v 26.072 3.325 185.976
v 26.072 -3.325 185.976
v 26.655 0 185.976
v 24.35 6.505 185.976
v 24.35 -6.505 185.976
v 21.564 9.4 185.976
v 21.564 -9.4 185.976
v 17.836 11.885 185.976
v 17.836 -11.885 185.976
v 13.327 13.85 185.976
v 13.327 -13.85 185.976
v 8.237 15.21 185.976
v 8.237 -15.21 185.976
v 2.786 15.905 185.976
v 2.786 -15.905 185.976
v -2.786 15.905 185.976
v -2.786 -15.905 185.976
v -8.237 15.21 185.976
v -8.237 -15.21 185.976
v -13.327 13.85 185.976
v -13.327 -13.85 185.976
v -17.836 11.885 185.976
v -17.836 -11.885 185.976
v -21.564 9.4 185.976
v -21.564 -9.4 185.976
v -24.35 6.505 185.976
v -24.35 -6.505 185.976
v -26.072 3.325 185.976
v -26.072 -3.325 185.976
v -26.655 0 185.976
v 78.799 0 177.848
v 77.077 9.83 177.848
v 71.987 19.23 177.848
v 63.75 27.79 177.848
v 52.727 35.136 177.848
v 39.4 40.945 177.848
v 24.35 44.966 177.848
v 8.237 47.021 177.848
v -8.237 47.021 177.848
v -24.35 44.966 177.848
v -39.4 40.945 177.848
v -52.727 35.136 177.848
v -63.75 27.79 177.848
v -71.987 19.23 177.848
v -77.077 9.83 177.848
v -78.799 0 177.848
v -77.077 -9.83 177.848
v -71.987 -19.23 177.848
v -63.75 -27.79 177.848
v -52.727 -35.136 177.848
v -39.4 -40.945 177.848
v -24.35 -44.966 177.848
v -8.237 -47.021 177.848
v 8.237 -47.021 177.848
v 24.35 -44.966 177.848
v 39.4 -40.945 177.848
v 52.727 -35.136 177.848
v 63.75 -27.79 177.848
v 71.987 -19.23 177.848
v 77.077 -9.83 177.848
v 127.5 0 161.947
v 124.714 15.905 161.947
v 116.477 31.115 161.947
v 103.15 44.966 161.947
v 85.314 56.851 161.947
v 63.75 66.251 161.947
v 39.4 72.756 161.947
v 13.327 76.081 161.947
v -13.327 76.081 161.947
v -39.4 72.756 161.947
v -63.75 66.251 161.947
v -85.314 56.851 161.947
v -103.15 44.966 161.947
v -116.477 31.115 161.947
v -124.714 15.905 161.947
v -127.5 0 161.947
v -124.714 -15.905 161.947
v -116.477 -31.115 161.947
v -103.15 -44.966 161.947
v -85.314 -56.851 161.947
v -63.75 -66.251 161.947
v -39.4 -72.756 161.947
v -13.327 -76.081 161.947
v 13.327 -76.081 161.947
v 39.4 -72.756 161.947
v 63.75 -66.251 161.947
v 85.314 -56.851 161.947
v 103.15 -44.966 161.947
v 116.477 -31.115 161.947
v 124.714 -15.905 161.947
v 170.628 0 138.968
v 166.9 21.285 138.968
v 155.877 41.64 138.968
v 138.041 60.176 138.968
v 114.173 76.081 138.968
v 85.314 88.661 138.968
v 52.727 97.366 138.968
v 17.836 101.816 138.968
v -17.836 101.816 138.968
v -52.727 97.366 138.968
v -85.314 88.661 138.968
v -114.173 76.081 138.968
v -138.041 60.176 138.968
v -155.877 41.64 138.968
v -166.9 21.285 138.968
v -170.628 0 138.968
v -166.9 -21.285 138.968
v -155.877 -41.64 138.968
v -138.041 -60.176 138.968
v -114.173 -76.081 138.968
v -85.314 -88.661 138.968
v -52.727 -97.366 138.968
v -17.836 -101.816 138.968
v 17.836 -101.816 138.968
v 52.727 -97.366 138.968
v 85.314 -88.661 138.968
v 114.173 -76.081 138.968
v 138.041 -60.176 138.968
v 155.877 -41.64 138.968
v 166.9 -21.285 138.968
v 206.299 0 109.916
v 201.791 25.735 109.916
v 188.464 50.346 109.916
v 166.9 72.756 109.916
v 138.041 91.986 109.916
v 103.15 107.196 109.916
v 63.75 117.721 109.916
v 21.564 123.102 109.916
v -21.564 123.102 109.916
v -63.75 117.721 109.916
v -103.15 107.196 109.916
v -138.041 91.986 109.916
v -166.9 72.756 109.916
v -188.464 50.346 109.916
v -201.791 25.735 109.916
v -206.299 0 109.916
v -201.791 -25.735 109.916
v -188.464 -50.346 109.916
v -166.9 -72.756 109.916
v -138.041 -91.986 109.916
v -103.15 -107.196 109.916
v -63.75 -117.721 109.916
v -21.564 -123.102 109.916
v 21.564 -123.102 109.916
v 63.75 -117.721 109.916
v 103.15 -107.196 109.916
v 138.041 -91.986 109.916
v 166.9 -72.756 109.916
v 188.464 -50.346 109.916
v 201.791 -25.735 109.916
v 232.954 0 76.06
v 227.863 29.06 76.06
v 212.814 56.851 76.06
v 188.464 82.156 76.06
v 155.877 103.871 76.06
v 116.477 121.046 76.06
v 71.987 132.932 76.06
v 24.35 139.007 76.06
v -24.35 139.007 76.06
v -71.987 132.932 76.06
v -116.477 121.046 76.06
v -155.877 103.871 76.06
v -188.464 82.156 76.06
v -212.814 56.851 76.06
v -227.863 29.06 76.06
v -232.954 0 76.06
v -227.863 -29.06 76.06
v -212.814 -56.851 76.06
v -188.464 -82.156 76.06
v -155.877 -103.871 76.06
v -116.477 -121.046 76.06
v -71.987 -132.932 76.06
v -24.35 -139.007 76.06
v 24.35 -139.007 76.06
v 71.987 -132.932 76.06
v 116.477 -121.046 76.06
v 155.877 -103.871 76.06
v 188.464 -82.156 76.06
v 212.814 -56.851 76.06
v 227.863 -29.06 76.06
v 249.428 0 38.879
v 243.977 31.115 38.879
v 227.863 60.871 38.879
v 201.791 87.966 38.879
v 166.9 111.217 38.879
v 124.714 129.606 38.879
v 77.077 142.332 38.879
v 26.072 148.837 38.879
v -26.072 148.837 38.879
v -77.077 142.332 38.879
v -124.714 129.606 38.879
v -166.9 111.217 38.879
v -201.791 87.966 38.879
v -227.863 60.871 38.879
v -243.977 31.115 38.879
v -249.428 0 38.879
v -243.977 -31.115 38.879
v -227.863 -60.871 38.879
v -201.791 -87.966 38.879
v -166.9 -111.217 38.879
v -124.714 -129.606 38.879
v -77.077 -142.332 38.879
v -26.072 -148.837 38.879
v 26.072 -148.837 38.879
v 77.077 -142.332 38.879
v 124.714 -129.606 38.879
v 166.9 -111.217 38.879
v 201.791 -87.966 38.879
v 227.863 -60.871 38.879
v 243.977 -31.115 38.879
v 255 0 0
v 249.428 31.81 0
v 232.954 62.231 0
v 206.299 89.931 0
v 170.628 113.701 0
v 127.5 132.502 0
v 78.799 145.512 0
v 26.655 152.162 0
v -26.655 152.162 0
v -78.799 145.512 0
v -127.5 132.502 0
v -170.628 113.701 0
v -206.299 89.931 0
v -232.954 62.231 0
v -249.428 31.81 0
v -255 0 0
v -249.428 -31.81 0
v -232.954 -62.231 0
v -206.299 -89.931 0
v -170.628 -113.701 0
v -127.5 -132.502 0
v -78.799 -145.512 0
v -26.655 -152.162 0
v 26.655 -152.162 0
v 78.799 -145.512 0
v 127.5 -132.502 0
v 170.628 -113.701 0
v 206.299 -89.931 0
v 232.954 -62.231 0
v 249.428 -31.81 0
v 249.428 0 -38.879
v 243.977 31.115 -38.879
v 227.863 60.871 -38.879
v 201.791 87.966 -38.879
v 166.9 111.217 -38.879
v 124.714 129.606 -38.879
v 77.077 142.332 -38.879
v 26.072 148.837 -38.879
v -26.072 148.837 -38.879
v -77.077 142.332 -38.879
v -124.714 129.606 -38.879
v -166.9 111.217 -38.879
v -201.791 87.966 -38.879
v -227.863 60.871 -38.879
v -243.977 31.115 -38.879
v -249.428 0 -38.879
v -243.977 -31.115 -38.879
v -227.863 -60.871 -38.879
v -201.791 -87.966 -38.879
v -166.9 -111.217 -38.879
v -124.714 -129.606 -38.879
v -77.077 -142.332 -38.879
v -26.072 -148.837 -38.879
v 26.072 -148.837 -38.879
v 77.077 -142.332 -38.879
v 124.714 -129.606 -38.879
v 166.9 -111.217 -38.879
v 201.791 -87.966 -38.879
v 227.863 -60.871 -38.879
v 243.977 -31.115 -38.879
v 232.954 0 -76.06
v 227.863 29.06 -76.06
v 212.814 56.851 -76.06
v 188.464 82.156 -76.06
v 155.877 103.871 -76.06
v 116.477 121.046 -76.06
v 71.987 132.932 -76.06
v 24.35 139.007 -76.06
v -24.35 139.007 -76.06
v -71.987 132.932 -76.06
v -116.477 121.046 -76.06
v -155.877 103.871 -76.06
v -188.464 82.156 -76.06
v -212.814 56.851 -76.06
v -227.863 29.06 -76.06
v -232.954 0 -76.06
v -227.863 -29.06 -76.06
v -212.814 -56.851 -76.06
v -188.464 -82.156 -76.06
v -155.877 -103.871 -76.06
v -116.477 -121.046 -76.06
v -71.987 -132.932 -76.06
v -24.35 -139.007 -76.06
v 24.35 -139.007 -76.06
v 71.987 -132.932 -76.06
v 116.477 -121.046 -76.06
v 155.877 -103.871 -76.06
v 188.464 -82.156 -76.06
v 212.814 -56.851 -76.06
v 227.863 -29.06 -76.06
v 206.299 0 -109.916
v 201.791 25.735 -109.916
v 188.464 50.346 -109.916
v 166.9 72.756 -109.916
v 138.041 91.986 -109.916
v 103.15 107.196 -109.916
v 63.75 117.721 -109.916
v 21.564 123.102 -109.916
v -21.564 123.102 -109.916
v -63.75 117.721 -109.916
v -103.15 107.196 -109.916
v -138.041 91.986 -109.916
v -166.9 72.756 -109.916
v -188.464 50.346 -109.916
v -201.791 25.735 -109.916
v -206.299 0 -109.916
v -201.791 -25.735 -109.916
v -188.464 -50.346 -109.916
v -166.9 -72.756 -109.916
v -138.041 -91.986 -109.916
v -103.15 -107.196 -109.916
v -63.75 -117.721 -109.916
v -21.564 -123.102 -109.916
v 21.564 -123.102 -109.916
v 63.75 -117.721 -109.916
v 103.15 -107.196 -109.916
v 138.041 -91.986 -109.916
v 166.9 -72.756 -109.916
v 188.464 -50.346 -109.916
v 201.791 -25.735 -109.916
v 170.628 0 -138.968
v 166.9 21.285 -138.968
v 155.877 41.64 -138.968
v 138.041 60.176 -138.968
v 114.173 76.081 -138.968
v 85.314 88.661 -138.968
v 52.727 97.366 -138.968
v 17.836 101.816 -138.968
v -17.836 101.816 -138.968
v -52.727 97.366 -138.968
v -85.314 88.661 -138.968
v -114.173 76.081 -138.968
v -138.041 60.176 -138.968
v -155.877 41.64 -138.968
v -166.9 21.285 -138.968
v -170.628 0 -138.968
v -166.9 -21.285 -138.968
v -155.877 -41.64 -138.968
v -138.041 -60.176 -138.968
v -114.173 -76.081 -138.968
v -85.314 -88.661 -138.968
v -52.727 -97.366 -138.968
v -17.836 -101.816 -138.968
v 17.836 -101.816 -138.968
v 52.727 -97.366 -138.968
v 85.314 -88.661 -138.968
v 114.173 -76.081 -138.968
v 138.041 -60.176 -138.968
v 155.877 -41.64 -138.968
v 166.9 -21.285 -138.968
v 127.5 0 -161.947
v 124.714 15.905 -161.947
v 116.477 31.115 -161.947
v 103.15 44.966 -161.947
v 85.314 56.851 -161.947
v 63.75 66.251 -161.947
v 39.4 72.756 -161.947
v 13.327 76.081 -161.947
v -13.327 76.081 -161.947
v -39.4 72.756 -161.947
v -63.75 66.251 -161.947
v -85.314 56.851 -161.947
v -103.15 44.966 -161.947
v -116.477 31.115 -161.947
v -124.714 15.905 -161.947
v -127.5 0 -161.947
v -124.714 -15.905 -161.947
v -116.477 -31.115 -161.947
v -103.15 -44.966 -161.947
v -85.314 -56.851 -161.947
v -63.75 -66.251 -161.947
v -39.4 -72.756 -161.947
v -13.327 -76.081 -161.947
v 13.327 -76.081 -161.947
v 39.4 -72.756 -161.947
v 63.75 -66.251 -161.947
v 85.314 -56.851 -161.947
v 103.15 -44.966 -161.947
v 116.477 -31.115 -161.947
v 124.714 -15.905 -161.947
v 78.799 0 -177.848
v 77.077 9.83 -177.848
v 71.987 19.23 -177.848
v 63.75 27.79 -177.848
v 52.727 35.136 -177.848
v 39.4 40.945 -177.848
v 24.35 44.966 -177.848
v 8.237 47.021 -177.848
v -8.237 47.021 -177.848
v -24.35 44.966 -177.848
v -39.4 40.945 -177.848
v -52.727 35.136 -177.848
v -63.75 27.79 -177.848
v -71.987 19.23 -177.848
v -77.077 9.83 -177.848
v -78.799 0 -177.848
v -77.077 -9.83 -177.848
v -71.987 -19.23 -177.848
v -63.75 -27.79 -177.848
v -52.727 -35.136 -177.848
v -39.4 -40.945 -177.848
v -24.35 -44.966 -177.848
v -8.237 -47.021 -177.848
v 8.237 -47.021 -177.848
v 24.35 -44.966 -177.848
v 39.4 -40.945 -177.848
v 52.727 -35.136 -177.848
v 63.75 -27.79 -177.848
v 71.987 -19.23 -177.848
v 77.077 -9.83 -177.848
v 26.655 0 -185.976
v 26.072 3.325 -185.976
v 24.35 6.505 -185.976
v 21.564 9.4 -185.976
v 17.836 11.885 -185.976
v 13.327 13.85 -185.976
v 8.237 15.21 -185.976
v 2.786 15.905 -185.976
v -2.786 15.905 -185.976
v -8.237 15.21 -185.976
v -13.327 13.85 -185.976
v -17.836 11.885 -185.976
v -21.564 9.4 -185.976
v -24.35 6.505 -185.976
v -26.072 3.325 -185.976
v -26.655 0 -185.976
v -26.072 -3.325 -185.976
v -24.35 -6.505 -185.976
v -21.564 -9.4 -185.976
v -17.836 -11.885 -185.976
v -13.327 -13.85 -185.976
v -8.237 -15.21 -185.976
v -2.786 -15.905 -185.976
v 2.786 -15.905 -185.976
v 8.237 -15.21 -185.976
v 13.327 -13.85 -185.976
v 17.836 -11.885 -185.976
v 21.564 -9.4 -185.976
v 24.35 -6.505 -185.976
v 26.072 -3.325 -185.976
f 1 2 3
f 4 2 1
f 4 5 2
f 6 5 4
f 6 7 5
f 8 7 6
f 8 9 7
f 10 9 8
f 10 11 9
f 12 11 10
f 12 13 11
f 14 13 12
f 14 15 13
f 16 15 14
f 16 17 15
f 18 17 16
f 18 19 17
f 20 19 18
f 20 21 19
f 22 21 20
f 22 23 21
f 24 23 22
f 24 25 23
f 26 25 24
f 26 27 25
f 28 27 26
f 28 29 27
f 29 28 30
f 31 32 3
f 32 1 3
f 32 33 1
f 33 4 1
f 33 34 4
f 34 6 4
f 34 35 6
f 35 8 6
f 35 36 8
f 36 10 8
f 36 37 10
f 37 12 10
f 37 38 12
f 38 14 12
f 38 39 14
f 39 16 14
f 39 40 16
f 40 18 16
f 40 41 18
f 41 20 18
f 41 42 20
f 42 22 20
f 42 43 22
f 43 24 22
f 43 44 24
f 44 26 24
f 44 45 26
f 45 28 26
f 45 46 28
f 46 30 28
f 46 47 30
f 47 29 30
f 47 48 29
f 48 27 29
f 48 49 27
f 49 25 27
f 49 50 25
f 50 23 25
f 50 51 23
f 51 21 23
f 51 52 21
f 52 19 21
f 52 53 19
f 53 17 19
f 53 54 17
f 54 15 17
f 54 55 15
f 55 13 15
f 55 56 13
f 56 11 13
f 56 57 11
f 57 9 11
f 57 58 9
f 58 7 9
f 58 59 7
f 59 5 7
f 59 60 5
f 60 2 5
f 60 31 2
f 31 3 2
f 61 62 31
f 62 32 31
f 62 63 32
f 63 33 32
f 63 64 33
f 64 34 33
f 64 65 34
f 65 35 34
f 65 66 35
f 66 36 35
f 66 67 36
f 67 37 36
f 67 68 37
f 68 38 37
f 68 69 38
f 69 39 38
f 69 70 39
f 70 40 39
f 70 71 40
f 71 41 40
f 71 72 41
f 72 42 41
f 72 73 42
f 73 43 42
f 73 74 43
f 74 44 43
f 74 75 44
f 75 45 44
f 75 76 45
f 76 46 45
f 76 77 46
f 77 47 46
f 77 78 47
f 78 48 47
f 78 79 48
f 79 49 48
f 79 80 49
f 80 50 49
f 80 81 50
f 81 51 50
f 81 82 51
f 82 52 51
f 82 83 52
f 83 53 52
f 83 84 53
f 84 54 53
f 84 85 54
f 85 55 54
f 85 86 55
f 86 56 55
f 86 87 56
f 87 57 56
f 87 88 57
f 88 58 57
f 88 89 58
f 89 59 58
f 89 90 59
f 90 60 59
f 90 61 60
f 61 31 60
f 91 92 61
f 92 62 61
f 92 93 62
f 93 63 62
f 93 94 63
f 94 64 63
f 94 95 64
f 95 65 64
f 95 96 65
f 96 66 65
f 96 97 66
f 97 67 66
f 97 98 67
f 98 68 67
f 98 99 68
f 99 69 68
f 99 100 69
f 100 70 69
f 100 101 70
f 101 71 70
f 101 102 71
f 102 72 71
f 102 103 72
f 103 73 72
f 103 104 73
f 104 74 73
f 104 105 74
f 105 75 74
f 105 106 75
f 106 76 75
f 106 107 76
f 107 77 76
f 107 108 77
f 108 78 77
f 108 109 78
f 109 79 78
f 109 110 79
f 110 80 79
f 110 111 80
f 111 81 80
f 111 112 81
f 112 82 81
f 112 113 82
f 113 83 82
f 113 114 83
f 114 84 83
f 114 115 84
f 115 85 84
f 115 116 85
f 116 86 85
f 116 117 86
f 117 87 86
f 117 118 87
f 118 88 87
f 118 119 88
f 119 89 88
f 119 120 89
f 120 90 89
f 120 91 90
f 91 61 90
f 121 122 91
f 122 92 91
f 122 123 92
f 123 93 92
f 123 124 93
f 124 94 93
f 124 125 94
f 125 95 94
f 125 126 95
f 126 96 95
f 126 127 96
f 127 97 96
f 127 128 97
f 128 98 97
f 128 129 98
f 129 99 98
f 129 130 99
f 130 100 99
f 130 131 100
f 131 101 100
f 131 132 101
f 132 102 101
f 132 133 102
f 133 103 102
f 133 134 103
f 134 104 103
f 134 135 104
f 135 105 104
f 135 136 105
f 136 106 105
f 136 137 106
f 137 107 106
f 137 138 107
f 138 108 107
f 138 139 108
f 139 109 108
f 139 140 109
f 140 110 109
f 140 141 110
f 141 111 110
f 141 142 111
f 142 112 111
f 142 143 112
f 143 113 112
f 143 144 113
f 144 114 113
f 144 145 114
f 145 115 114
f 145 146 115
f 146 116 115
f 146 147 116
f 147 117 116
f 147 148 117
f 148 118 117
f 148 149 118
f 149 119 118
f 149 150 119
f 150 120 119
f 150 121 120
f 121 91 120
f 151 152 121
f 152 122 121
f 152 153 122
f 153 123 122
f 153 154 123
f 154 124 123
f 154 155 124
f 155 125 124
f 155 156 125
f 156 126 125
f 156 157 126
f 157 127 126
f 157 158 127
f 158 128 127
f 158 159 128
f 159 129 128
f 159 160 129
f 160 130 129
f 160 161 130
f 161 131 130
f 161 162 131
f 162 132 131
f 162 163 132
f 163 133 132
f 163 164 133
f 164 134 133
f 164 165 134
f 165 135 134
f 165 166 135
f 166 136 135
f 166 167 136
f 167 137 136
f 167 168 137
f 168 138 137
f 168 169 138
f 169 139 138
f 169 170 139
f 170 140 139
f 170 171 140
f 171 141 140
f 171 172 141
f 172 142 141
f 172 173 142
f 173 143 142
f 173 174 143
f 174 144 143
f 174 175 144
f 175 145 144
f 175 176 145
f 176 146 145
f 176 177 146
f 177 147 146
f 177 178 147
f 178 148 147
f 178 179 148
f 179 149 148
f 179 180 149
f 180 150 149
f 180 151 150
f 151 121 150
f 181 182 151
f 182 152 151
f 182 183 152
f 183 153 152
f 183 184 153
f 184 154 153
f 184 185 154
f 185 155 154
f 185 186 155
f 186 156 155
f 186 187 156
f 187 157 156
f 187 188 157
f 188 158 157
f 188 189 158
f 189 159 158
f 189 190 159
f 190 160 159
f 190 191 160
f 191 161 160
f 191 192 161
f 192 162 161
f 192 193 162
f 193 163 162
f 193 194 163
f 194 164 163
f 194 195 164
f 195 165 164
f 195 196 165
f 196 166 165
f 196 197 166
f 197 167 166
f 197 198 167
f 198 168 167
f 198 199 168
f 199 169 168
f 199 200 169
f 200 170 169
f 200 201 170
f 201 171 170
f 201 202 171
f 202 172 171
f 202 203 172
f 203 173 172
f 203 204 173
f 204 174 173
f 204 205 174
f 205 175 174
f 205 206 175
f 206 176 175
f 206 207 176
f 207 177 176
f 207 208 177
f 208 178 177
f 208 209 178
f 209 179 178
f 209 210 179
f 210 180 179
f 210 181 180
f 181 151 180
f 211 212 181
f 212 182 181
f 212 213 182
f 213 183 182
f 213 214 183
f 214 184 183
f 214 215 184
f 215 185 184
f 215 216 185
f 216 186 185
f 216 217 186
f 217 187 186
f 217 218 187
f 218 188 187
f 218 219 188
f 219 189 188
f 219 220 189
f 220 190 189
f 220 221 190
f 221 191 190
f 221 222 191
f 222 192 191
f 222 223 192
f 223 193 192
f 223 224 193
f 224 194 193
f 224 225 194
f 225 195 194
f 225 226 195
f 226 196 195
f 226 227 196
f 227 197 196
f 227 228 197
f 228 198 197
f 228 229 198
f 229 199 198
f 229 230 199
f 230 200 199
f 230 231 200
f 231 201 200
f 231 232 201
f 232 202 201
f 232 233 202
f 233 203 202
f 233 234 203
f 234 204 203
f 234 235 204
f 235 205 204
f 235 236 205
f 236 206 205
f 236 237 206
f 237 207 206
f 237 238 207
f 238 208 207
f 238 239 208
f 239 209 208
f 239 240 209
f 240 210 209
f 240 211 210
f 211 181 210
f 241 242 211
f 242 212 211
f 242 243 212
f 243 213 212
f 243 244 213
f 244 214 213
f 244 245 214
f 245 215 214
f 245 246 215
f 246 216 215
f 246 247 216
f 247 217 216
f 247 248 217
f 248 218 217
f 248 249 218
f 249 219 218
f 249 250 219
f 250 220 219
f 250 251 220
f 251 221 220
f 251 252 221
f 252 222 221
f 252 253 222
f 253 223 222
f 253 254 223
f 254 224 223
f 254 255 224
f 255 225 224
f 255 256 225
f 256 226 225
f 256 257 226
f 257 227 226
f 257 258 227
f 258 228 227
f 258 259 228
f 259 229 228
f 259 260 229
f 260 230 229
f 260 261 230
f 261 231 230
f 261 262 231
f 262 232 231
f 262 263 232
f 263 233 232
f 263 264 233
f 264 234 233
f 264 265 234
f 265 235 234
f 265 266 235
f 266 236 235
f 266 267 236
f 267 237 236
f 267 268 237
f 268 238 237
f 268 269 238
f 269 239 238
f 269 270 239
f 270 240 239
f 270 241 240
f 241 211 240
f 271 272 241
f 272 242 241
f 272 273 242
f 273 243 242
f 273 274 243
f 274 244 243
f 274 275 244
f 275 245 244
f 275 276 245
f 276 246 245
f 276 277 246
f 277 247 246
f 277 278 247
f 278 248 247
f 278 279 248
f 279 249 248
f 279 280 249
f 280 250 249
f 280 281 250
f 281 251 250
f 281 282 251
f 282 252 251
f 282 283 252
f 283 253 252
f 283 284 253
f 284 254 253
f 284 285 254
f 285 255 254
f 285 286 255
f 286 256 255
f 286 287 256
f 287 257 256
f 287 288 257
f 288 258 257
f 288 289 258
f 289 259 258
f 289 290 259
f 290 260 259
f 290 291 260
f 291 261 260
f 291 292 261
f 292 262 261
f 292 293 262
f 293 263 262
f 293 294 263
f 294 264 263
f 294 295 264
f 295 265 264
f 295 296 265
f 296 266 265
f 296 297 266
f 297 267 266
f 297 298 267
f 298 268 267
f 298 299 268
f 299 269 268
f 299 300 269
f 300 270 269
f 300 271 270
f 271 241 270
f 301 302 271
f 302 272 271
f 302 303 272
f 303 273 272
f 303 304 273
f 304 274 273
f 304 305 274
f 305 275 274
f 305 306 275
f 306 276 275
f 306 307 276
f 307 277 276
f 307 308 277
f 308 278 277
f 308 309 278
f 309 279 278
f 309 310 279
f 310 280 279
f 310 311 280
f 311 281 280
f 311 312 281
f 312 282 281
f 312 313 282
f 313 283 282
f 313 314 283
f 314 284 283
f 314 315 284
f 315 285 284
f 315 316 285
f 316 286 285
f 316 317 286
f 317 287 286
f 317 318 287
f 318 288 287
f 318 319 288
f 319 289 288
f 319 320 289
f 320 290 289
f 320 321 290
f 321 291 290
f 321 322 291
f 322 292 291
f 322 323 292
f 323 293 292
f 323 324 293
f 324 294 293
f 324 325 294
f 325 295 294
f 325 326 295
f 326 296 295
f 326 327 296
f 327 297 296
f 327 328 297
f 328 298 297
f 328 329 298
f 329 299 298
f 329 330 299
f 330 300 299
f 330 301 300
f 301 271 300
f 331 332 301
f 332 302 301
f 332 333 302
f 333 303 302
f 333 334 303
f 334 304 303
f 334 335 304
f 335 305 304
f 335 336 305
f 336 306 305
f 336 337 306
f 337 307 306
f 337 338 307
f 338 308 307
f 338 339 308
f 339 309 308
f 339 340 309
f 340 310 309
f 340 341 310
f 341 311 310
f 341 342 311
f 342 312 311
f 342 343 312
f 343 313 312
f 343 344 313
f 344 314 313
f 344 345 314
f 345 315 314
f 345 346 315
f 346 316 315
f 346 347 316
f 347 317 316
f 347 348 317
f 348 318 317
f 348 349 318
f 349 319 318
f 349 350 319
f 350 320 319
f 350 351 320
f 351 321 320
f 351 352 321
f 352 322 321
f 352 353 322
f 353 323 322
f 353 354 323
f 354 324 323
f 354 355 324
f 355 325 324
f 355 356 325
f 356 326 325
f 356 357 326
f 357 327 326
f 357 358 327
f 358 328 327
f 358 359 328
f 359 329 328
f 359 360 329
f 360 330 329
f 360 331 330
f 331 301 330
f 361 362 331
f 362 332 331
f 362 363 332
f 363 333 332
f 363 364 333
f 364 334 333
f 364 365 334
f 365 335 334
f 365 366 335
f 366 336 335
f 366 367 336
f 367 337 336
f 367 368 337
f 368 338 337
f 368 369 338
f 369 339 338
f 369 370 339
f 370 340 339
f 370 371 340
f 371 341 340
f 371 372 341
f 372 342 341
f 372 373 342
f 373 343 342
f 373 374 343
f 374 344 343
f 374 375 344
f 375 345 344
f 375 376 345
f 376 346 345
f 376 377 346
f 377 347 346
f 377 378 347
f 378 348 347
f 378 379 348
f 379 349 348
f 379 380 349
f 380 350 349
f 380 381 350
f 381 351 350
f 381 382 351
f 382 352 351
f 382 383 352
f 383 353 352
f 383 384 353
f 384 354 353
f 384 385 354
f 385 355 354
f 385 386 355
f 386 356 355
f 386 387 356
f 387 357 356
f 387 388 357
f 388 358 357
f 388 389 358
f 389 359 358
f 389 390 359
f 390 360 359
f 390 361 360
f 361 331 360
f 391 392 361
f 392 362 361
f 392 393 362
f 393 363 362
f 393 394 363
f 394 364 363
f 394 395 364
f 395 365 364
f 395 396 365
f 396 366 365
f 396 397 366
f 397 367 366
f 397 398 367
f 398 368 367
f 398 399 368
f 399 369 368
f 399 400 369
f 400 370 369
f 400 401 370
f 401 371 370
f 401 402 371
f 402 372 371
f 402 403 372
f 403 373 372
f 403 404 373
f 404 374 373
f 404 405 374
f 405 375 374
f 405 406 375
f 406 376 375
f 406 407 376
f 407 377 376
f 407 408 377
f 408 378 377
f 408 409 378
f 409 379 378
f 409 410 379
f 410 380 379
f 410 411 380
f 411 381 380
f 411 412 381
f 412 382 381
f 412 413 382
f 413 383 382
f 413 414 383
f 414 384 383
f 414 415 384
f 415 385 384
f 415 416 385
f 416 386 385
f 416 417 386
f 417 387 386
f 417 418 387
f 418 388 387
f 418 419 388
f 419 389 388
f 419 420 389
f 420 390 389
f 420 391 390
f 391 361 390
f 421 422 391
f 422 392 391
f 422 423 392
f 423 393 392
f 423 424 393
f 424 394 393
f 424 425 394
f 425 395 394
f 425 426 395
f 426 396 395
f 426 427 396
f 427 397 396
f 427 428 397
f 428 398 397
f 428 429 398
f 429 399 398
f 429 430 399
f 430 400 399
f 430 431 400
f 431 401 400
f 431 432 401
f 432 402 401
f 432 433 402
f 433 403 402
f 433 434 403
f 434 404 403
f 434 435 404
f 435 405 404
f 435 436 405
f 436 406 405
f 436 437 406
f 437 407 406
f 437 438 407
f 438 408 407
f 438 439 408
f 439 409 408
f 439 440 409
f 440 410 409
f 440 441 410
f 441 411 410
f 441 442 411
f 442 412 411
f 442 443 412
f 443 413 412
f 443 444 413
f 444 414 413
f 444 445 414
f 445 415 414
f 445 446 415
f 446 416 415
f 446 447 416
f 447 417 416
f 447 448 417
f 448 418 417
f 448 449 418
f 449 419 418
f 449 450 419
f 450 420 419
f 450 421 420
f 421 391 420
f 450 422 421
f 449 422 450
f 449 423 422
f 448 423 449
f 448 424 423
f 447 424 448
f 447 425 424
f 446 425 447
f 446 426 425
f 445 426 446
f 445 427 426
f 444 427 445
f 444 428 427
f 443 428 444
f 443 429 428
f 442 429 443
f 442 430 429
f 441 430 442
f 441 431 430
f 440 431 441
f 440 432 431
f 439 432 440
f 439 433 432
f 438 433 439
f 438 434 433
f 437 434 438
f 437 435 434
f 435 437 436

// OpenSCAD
// Generated by SolidPython 1.0.1 on 2020-07-29 00:46:52


scale(v = [15, 9, 11]) {
	sphere(r = 17);
}
/***********************************************
*********      SolidPython code:      **********
************************************************
 
# import packages: SolidPython
from solid import *
from solid.utils import *
from itertools import chain, combinations, permutations


class Resize:

    def __init__(self, scad_file):
        self.scad_file = scad_file
        #self.scad_file = import_scad(scad_file)
        # cone/cylinder param:
        self.r1 = 0
        self.r2 = 0
        self.h = 0
        # rectangular prism param:
        self.w = 0
        self.l = 0
        # ellipse param:
        self.r = 0

    # import OpenScad code (file name corresponds to shape)


    # classify shape + parameters
    def assign(self, param1, param2, param3):
        if self.scad_file == 'cone.scad':
            self.r1 = param1
            self.r2 = param2
            self.h = param3
        elif self.scad_file == 'cylinder.scad':
            self.r1 = param1
            self.r2 = param2
            self.h = param3
        elif self.scad_file == 'rectangularPrism.scad':
            self.h = param1
            self.l = param2
            self.w = param3
        else:
            self.r = param1
            self.h = param2

    # resize parameters
    def iterate(self):
        x = range(3, 20, 2)
        i = 1
        if self.scad_file == 'cone.scad':
            tempList = list(permutations(x, 2))
            for temp in tempList:
                param1 = temp[0]
                param2 = temp[1]
                filepath = 'produced_scad_files/' + 'cone' + str(param1) + '_' + str(param2) + '_' + '.scad'
                scad_render_to_file(cylinder(h=param1, r1=param2, r2=0), filepath)

        elif self.scad_file == 'cylinder.scad':
            tempList = list(permutations(x, 3))
            for temp in tempList:
                param1 = temp[0]
                param2 = temp[1]
                filepath = 'produced_scad_files/' + 'cylinder' + str(param1) + '_' + str(param2) + '_' + '.scad'
                scad_render_to_file(cylinder(h=param1, r1=param2, r2=param2), filepath)

        elif self.scad_file == 'rectangularPrism.scad':
            tempList = list(permutations(x, 3))
            for temp in tempList:
                param1 = temp[0]
                param2 = temp[1]
                param3 = temp[2]
                filepath = 'produced_scad_files/' + 'rectangularPrism' + str(param1) + '_' + str(param2) + '_' + str(
                    param3) + '.scad'
                scad_render_to_file(cube(size=(param1, param2, param3)), filepath)

        elif self.scad_file == 'ellipse.scad':
            tempList = list(permutations(x, 4))
            for temp in tempList:
                param1 = temp[0]
                param2 = temp[1]
                param3 = temp[2]
                param4 = temp[3]
                filepath = 'produced_scad_files/' + 'ellipse' + str(param1) + '_' + str(param2) + '_' + str(param3) + '_' + str(param4) + '.scad'
                scad_render_to_file(scale([param1, param2, param3])(sphere(r=param4)), filepath)

    def render_to_scadfile(self):
        scad_render_to_file(scad, 'example.scad') 
 
************************************************/
